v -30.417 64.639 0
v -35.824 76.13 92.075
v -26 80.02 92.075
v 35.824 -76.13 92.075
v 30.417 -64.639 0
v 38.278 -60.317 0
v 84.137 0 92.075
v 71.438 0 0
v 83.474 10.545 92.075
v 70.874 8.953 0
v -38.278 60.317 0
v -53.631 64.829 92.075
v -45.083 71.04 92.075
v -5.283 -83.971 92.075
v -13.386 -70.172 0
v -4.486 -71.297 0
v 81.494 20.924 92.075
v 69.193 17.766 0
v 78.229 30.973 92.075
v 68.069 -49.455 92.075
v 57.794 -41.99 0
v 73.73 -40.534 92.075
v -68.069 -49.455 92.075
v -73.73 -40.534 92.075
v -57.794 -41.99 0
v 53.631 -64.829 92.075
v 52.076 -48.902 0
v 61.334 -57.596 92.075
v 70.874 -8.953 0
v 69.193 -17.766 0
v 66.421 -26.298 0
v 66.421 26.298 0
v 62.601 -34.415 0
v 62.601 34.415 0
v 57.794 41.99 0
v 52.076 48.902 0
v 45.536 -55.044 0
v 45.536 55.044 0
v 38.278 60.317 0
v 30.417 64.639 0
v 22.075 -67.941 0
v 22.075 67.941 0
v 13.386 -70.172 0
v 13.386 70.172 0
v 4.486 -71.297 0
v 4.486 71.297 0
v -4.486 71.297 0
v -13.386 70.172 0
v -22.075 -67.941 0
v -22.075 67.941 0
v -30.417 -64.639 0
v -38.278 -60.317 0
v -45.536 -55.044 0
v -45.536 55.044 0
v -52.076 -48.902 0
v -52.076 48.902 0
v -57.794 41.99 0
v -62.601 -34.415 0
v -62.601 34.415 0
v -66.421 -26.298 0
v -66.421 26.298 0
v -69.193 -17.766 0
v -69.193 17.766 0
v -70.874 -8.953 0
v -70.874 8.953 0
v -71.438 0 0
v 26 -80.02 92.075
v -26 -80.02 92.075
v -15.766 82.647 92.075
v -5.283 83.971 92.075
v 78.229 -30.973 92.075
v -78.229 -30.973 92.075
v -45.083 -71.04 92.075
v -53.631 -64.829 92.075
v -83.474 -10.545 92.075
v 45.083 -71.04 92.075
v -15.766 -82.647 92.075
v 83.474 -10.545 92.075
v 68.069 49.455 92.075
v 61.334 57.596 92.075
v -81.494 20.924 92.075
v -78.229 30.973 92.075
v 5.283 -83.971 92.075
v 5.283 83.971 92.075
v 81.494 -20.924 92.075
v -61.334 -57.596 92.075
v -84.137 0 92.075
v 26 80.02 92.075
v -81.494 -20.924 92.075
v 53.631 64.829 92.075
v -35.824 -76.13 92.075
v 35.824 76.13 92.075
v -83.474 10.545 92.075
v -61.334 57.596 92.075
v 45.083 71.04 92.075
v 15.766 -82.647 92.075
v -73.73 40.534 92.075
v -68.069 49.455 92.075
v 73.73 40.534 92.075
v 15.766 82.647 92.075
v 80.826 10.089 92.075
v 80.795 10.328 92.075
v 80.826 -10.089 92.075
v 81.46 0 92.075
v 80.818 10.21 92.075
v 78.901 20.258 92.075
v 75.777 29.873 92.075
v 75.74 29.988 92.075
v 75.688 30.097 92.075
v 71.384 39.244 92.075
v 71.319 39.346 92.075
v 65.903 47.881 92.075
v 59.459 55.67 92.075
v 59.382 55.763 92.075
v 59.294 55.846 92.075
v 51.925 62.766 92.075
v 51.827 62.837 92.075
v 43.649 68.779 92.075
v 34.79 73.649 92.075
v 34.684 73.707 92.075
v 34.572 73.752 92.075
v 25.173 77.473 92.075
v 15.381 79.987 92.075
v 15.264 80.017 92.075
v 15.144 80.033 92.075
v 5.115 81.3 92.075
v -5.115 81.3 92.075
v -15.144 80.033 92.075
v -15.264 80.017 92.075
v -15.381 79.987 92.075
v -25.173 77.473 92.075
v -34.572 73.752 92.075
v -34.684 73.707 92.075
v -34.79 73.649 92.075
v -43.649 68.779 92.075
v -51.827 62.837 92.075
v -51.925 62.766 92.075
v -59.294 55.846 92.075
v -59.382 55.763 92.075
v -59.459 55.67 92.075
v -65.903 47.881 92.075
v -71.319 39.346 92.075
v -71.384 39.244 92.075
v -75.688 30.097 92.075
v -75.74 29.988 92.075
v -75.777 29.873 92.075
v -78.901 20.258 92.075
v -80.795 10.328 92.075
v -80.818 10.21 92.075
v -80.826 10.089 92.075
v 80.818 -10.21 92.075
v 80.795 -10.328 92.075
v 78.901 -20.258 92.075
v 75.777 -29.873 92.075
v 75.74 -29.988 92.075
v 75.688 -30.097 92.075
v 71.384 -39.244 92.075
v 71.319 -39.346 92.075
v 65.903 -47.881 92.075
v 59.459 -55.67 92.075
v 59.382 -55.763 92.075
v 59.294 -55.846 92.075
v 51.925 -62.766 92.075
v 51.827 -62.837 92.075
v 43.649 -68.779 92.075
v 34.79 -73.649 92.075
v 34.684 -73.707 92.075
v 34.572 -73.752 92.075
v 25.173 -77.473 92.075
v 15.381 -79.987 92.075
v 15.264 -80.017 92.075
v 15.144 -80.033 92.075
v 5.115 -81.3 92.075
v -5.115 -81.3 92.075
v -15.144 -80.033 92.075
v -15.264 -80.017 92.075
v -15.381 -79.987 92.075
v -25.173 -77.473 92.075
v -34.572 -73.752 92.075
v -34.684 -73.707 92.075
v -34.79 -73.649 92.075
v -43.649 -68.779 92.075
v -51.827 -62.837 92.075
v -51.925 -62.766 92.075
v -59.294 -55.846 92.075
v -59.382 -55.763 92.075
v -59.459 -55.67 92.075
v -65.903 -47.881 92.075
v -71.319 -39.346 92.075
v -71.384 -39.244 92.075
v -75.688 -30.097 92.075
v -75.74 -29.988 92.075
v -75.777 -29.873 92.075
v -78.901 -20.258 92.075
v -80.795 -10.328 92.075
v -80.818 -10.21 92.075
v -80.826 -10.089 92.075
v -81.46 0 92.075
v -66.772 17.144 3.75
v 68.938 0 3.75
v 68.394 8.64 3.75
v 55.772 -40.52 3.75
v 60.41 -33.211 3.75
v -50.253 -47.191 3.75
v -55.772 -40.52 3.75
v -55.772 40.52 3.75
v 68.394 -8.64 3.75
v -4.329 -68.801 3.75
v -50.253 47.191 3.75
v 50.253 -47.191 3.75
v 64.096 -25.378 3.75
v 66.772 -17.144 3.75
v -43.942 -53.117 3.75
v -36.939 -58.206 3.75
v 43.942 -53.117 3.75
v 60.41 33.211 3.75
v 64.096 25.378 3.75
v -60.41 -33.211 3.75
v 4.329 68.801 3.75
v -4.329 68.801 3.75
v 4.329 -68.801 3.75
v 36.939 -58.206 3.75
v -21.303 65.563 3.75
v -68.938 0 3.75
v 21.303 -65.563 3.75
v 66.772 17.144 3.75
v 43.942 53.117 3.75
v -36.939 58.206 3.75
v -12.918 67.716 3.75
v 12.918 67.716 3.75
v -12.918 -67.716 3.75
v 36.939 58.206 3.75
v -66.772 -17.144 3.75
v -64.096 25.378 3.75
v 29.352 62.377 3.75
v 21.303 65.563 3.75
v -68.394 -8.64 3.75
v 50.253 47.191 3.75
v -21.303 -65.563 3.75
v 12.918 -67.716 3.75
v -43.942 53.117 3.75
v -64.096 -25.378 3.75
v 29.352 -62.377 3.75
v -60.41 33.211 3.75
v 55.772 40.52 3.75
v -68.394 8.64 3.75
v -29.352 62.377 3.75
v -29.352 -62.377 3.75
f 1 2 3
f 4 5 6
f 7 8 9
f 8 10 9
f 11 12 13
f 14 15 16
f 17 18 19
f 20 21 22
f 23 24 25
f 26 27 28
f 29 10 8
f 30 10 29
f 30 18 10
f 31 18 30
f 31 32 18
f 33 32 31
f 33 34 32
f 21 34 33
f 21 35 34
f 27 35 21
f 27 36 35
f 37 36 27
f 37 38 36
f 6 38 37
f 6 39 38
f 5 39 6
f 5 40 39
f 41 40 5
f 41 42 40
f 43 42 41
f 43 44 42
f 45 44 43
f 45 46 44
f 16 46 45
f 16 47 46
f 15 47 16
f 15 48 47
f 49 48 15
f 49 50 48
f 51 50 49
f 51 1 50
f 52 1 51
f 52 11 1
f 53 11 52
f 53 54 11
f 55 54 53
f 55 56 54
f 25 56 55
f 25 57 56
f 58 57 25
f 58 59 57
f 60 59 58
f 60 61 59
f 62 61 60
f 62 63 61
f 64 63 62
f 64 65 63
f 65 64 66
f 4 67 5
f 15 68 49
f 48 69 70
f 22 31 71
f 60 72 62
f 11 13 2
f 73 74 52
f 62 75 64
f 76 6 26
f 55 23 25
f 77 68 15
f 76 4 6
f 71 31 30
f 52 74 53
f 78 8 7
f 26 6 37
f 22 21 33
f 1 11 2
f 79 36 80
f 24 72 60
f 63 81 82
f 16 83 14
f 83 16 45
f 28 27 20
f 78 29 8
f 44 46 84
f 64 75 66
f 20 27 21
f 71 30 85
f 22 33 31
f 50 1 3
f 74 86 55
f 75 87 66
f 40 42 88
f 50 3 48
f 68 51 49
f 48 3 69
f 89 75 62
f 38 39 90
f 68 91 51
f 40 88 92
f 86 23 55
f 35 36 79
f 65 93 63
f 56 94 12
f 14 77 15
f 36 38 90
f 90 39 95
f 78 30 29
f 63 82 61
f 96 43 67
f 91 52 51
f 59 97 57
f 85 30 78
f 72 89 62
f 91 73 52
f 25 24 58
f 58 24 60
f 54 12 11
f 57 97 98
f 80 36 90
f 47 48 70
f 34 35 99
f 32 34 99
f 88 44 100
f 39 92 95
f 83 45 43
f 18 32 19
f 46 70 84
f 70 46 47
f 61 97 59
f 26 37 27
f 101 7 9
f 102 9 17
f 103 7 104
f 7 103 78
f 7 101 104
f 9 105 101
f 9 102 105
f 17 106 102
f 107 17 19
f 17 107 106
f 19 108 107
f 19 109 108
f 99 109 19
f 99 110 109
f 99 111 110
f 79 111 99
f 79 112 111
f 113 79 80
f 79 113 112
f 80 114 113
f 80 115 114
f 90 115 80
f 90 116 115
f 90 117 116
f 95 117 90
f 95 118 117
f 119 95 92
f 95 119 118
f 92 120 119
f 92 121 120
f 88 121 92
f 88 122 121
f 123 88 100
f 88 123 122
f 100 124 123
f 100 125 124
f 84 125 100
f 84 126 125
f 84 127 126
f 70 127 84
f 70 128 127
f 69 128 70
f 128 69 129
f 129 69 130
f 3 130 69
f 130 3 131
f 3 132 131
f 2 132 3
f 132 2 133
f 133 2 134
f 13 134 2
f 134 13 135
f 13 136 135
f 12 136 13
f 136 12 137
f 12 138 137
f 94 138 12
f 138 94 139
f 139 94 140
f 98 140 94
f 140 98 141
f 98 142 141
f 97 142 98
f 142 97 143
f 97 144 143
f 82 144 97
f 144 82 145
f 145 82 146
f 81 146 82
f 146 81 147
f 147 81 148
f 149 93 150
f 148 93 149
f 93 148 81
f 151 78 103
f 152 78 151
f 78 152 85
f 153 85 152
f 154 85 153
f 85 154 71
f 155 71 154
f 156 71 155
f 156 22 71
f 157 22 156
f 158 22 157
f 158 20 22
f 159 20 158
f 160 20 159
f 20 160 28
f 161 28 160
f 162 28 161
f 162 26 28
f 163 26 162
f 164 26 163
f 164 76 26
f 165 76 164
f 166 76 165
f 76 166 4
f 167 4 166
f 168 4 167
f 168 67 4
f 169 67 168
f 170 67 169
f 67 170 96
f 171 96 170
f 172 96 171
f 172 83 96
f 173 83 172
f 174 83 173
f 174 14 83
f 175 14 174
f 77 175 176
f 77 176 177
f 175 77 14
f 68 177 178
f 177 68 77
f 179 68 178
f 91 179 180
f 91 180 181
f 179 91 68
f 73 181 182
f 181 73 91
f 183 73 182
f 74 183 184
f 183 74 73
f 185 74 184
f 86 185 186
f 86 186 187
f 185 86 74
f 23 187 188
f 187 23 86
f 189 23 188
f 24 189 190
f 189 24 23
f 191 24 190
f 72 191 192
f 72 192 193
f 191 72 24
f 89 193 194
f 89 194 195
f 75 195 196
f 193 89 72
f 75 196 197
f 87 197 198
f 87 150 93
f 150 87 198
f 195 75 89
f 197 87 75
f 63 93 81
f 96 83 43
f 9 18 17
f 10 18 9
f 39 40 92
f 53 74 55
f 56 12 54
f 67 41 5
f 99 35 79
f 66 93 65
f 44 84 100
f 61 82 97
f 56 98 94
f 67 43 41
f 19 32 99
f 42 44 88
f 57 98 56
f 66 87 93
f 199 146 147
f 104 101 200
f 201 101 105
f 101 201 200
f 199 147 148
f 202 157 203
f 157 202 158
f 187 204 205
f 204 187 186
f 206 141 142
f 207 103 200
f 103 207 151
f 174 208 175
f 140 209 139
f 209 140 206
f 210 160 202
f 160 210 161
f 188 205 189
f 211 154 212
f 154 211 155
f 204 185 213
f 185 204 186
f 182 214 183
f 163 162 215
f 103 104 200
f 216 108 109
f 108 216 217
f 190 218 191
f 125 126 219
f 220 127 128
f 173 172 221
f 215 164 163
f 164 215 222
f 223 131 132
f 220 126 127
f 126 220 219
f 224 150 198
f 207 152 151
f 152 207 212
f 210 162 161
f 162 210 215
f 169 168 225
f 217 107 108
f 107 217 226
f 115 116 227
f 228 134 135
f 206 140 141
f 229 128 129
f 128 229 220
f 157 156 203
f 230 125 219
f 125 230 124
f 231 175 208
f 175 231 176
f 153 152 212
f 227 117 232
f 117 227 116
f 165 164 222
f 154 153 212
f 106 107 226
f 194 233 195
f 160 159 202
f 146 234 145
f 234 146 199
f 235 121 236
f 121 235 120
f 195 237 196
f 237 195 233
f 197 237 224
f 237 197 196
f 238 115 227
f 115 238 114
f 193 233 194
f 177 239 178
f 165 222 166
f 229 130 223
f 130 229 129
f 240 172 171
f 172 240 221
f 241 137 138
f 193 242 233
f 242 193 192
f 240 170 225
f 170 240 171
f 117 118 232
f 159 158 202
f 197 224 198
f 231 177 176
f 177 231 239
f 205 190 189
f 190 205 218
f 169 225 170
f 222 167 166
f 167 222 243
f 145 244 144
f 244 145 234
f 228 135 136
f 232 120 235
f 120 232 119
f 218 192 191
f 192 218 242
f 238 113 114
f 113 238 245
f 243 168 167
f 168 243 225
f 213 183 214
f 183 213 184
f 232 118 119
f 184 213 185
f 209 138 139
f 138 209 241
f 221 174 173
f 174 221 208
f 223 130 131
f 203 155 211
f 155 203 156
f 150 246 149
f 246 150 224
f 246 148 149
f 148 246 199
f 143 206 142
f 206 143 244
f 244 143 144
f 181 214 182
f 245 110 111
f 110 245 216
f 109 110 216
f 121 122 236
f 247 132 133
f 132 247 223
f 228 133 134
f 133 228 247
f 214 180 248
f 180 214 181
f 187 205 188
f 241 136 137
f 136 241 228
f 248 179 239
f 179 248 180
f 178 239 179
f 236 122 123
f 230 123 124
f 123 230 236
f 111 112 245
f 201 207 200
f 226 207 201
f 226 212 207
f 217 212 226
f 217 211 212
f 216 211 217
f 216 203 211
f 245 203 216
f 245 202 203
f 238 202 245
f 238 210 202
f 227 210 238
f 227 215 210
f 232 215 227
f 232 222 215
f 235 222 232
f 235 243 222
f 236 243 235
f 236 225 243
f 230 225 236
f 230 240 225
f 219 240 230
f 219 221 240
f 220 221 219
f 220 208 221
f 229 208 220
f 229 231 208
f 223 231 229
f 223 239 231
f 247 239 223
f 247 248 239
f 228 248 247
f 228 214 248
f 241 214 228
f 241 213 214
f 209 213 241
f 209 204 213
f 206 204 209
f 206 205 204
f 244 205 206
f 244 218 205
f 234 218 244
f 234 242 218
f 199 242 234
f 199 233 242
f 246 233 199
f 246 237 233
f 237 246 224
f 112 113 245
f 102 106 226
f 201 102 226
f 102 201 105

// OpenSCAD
$fn = 50;
upperDiameter = 6.625 * 25.4;
lowerDiameter = 5.625 * 25.4;
height = 3.625 * 25.4;
wallThickness = 2.5;

difference() {
    translate([0,0,height/2])
        cylinder(h = height, d1 = lowerDiameter, 
            d2 = upperDiameter, center = true);
    translate([0,0,height/2+wallThickness])
        cylinder(h = height-wallThickness, 
            d1 = lowerDiameter - 2*wallThickness, 
            d2 = upperDiameter - 2*wallThickness, 
            center = true);
}
